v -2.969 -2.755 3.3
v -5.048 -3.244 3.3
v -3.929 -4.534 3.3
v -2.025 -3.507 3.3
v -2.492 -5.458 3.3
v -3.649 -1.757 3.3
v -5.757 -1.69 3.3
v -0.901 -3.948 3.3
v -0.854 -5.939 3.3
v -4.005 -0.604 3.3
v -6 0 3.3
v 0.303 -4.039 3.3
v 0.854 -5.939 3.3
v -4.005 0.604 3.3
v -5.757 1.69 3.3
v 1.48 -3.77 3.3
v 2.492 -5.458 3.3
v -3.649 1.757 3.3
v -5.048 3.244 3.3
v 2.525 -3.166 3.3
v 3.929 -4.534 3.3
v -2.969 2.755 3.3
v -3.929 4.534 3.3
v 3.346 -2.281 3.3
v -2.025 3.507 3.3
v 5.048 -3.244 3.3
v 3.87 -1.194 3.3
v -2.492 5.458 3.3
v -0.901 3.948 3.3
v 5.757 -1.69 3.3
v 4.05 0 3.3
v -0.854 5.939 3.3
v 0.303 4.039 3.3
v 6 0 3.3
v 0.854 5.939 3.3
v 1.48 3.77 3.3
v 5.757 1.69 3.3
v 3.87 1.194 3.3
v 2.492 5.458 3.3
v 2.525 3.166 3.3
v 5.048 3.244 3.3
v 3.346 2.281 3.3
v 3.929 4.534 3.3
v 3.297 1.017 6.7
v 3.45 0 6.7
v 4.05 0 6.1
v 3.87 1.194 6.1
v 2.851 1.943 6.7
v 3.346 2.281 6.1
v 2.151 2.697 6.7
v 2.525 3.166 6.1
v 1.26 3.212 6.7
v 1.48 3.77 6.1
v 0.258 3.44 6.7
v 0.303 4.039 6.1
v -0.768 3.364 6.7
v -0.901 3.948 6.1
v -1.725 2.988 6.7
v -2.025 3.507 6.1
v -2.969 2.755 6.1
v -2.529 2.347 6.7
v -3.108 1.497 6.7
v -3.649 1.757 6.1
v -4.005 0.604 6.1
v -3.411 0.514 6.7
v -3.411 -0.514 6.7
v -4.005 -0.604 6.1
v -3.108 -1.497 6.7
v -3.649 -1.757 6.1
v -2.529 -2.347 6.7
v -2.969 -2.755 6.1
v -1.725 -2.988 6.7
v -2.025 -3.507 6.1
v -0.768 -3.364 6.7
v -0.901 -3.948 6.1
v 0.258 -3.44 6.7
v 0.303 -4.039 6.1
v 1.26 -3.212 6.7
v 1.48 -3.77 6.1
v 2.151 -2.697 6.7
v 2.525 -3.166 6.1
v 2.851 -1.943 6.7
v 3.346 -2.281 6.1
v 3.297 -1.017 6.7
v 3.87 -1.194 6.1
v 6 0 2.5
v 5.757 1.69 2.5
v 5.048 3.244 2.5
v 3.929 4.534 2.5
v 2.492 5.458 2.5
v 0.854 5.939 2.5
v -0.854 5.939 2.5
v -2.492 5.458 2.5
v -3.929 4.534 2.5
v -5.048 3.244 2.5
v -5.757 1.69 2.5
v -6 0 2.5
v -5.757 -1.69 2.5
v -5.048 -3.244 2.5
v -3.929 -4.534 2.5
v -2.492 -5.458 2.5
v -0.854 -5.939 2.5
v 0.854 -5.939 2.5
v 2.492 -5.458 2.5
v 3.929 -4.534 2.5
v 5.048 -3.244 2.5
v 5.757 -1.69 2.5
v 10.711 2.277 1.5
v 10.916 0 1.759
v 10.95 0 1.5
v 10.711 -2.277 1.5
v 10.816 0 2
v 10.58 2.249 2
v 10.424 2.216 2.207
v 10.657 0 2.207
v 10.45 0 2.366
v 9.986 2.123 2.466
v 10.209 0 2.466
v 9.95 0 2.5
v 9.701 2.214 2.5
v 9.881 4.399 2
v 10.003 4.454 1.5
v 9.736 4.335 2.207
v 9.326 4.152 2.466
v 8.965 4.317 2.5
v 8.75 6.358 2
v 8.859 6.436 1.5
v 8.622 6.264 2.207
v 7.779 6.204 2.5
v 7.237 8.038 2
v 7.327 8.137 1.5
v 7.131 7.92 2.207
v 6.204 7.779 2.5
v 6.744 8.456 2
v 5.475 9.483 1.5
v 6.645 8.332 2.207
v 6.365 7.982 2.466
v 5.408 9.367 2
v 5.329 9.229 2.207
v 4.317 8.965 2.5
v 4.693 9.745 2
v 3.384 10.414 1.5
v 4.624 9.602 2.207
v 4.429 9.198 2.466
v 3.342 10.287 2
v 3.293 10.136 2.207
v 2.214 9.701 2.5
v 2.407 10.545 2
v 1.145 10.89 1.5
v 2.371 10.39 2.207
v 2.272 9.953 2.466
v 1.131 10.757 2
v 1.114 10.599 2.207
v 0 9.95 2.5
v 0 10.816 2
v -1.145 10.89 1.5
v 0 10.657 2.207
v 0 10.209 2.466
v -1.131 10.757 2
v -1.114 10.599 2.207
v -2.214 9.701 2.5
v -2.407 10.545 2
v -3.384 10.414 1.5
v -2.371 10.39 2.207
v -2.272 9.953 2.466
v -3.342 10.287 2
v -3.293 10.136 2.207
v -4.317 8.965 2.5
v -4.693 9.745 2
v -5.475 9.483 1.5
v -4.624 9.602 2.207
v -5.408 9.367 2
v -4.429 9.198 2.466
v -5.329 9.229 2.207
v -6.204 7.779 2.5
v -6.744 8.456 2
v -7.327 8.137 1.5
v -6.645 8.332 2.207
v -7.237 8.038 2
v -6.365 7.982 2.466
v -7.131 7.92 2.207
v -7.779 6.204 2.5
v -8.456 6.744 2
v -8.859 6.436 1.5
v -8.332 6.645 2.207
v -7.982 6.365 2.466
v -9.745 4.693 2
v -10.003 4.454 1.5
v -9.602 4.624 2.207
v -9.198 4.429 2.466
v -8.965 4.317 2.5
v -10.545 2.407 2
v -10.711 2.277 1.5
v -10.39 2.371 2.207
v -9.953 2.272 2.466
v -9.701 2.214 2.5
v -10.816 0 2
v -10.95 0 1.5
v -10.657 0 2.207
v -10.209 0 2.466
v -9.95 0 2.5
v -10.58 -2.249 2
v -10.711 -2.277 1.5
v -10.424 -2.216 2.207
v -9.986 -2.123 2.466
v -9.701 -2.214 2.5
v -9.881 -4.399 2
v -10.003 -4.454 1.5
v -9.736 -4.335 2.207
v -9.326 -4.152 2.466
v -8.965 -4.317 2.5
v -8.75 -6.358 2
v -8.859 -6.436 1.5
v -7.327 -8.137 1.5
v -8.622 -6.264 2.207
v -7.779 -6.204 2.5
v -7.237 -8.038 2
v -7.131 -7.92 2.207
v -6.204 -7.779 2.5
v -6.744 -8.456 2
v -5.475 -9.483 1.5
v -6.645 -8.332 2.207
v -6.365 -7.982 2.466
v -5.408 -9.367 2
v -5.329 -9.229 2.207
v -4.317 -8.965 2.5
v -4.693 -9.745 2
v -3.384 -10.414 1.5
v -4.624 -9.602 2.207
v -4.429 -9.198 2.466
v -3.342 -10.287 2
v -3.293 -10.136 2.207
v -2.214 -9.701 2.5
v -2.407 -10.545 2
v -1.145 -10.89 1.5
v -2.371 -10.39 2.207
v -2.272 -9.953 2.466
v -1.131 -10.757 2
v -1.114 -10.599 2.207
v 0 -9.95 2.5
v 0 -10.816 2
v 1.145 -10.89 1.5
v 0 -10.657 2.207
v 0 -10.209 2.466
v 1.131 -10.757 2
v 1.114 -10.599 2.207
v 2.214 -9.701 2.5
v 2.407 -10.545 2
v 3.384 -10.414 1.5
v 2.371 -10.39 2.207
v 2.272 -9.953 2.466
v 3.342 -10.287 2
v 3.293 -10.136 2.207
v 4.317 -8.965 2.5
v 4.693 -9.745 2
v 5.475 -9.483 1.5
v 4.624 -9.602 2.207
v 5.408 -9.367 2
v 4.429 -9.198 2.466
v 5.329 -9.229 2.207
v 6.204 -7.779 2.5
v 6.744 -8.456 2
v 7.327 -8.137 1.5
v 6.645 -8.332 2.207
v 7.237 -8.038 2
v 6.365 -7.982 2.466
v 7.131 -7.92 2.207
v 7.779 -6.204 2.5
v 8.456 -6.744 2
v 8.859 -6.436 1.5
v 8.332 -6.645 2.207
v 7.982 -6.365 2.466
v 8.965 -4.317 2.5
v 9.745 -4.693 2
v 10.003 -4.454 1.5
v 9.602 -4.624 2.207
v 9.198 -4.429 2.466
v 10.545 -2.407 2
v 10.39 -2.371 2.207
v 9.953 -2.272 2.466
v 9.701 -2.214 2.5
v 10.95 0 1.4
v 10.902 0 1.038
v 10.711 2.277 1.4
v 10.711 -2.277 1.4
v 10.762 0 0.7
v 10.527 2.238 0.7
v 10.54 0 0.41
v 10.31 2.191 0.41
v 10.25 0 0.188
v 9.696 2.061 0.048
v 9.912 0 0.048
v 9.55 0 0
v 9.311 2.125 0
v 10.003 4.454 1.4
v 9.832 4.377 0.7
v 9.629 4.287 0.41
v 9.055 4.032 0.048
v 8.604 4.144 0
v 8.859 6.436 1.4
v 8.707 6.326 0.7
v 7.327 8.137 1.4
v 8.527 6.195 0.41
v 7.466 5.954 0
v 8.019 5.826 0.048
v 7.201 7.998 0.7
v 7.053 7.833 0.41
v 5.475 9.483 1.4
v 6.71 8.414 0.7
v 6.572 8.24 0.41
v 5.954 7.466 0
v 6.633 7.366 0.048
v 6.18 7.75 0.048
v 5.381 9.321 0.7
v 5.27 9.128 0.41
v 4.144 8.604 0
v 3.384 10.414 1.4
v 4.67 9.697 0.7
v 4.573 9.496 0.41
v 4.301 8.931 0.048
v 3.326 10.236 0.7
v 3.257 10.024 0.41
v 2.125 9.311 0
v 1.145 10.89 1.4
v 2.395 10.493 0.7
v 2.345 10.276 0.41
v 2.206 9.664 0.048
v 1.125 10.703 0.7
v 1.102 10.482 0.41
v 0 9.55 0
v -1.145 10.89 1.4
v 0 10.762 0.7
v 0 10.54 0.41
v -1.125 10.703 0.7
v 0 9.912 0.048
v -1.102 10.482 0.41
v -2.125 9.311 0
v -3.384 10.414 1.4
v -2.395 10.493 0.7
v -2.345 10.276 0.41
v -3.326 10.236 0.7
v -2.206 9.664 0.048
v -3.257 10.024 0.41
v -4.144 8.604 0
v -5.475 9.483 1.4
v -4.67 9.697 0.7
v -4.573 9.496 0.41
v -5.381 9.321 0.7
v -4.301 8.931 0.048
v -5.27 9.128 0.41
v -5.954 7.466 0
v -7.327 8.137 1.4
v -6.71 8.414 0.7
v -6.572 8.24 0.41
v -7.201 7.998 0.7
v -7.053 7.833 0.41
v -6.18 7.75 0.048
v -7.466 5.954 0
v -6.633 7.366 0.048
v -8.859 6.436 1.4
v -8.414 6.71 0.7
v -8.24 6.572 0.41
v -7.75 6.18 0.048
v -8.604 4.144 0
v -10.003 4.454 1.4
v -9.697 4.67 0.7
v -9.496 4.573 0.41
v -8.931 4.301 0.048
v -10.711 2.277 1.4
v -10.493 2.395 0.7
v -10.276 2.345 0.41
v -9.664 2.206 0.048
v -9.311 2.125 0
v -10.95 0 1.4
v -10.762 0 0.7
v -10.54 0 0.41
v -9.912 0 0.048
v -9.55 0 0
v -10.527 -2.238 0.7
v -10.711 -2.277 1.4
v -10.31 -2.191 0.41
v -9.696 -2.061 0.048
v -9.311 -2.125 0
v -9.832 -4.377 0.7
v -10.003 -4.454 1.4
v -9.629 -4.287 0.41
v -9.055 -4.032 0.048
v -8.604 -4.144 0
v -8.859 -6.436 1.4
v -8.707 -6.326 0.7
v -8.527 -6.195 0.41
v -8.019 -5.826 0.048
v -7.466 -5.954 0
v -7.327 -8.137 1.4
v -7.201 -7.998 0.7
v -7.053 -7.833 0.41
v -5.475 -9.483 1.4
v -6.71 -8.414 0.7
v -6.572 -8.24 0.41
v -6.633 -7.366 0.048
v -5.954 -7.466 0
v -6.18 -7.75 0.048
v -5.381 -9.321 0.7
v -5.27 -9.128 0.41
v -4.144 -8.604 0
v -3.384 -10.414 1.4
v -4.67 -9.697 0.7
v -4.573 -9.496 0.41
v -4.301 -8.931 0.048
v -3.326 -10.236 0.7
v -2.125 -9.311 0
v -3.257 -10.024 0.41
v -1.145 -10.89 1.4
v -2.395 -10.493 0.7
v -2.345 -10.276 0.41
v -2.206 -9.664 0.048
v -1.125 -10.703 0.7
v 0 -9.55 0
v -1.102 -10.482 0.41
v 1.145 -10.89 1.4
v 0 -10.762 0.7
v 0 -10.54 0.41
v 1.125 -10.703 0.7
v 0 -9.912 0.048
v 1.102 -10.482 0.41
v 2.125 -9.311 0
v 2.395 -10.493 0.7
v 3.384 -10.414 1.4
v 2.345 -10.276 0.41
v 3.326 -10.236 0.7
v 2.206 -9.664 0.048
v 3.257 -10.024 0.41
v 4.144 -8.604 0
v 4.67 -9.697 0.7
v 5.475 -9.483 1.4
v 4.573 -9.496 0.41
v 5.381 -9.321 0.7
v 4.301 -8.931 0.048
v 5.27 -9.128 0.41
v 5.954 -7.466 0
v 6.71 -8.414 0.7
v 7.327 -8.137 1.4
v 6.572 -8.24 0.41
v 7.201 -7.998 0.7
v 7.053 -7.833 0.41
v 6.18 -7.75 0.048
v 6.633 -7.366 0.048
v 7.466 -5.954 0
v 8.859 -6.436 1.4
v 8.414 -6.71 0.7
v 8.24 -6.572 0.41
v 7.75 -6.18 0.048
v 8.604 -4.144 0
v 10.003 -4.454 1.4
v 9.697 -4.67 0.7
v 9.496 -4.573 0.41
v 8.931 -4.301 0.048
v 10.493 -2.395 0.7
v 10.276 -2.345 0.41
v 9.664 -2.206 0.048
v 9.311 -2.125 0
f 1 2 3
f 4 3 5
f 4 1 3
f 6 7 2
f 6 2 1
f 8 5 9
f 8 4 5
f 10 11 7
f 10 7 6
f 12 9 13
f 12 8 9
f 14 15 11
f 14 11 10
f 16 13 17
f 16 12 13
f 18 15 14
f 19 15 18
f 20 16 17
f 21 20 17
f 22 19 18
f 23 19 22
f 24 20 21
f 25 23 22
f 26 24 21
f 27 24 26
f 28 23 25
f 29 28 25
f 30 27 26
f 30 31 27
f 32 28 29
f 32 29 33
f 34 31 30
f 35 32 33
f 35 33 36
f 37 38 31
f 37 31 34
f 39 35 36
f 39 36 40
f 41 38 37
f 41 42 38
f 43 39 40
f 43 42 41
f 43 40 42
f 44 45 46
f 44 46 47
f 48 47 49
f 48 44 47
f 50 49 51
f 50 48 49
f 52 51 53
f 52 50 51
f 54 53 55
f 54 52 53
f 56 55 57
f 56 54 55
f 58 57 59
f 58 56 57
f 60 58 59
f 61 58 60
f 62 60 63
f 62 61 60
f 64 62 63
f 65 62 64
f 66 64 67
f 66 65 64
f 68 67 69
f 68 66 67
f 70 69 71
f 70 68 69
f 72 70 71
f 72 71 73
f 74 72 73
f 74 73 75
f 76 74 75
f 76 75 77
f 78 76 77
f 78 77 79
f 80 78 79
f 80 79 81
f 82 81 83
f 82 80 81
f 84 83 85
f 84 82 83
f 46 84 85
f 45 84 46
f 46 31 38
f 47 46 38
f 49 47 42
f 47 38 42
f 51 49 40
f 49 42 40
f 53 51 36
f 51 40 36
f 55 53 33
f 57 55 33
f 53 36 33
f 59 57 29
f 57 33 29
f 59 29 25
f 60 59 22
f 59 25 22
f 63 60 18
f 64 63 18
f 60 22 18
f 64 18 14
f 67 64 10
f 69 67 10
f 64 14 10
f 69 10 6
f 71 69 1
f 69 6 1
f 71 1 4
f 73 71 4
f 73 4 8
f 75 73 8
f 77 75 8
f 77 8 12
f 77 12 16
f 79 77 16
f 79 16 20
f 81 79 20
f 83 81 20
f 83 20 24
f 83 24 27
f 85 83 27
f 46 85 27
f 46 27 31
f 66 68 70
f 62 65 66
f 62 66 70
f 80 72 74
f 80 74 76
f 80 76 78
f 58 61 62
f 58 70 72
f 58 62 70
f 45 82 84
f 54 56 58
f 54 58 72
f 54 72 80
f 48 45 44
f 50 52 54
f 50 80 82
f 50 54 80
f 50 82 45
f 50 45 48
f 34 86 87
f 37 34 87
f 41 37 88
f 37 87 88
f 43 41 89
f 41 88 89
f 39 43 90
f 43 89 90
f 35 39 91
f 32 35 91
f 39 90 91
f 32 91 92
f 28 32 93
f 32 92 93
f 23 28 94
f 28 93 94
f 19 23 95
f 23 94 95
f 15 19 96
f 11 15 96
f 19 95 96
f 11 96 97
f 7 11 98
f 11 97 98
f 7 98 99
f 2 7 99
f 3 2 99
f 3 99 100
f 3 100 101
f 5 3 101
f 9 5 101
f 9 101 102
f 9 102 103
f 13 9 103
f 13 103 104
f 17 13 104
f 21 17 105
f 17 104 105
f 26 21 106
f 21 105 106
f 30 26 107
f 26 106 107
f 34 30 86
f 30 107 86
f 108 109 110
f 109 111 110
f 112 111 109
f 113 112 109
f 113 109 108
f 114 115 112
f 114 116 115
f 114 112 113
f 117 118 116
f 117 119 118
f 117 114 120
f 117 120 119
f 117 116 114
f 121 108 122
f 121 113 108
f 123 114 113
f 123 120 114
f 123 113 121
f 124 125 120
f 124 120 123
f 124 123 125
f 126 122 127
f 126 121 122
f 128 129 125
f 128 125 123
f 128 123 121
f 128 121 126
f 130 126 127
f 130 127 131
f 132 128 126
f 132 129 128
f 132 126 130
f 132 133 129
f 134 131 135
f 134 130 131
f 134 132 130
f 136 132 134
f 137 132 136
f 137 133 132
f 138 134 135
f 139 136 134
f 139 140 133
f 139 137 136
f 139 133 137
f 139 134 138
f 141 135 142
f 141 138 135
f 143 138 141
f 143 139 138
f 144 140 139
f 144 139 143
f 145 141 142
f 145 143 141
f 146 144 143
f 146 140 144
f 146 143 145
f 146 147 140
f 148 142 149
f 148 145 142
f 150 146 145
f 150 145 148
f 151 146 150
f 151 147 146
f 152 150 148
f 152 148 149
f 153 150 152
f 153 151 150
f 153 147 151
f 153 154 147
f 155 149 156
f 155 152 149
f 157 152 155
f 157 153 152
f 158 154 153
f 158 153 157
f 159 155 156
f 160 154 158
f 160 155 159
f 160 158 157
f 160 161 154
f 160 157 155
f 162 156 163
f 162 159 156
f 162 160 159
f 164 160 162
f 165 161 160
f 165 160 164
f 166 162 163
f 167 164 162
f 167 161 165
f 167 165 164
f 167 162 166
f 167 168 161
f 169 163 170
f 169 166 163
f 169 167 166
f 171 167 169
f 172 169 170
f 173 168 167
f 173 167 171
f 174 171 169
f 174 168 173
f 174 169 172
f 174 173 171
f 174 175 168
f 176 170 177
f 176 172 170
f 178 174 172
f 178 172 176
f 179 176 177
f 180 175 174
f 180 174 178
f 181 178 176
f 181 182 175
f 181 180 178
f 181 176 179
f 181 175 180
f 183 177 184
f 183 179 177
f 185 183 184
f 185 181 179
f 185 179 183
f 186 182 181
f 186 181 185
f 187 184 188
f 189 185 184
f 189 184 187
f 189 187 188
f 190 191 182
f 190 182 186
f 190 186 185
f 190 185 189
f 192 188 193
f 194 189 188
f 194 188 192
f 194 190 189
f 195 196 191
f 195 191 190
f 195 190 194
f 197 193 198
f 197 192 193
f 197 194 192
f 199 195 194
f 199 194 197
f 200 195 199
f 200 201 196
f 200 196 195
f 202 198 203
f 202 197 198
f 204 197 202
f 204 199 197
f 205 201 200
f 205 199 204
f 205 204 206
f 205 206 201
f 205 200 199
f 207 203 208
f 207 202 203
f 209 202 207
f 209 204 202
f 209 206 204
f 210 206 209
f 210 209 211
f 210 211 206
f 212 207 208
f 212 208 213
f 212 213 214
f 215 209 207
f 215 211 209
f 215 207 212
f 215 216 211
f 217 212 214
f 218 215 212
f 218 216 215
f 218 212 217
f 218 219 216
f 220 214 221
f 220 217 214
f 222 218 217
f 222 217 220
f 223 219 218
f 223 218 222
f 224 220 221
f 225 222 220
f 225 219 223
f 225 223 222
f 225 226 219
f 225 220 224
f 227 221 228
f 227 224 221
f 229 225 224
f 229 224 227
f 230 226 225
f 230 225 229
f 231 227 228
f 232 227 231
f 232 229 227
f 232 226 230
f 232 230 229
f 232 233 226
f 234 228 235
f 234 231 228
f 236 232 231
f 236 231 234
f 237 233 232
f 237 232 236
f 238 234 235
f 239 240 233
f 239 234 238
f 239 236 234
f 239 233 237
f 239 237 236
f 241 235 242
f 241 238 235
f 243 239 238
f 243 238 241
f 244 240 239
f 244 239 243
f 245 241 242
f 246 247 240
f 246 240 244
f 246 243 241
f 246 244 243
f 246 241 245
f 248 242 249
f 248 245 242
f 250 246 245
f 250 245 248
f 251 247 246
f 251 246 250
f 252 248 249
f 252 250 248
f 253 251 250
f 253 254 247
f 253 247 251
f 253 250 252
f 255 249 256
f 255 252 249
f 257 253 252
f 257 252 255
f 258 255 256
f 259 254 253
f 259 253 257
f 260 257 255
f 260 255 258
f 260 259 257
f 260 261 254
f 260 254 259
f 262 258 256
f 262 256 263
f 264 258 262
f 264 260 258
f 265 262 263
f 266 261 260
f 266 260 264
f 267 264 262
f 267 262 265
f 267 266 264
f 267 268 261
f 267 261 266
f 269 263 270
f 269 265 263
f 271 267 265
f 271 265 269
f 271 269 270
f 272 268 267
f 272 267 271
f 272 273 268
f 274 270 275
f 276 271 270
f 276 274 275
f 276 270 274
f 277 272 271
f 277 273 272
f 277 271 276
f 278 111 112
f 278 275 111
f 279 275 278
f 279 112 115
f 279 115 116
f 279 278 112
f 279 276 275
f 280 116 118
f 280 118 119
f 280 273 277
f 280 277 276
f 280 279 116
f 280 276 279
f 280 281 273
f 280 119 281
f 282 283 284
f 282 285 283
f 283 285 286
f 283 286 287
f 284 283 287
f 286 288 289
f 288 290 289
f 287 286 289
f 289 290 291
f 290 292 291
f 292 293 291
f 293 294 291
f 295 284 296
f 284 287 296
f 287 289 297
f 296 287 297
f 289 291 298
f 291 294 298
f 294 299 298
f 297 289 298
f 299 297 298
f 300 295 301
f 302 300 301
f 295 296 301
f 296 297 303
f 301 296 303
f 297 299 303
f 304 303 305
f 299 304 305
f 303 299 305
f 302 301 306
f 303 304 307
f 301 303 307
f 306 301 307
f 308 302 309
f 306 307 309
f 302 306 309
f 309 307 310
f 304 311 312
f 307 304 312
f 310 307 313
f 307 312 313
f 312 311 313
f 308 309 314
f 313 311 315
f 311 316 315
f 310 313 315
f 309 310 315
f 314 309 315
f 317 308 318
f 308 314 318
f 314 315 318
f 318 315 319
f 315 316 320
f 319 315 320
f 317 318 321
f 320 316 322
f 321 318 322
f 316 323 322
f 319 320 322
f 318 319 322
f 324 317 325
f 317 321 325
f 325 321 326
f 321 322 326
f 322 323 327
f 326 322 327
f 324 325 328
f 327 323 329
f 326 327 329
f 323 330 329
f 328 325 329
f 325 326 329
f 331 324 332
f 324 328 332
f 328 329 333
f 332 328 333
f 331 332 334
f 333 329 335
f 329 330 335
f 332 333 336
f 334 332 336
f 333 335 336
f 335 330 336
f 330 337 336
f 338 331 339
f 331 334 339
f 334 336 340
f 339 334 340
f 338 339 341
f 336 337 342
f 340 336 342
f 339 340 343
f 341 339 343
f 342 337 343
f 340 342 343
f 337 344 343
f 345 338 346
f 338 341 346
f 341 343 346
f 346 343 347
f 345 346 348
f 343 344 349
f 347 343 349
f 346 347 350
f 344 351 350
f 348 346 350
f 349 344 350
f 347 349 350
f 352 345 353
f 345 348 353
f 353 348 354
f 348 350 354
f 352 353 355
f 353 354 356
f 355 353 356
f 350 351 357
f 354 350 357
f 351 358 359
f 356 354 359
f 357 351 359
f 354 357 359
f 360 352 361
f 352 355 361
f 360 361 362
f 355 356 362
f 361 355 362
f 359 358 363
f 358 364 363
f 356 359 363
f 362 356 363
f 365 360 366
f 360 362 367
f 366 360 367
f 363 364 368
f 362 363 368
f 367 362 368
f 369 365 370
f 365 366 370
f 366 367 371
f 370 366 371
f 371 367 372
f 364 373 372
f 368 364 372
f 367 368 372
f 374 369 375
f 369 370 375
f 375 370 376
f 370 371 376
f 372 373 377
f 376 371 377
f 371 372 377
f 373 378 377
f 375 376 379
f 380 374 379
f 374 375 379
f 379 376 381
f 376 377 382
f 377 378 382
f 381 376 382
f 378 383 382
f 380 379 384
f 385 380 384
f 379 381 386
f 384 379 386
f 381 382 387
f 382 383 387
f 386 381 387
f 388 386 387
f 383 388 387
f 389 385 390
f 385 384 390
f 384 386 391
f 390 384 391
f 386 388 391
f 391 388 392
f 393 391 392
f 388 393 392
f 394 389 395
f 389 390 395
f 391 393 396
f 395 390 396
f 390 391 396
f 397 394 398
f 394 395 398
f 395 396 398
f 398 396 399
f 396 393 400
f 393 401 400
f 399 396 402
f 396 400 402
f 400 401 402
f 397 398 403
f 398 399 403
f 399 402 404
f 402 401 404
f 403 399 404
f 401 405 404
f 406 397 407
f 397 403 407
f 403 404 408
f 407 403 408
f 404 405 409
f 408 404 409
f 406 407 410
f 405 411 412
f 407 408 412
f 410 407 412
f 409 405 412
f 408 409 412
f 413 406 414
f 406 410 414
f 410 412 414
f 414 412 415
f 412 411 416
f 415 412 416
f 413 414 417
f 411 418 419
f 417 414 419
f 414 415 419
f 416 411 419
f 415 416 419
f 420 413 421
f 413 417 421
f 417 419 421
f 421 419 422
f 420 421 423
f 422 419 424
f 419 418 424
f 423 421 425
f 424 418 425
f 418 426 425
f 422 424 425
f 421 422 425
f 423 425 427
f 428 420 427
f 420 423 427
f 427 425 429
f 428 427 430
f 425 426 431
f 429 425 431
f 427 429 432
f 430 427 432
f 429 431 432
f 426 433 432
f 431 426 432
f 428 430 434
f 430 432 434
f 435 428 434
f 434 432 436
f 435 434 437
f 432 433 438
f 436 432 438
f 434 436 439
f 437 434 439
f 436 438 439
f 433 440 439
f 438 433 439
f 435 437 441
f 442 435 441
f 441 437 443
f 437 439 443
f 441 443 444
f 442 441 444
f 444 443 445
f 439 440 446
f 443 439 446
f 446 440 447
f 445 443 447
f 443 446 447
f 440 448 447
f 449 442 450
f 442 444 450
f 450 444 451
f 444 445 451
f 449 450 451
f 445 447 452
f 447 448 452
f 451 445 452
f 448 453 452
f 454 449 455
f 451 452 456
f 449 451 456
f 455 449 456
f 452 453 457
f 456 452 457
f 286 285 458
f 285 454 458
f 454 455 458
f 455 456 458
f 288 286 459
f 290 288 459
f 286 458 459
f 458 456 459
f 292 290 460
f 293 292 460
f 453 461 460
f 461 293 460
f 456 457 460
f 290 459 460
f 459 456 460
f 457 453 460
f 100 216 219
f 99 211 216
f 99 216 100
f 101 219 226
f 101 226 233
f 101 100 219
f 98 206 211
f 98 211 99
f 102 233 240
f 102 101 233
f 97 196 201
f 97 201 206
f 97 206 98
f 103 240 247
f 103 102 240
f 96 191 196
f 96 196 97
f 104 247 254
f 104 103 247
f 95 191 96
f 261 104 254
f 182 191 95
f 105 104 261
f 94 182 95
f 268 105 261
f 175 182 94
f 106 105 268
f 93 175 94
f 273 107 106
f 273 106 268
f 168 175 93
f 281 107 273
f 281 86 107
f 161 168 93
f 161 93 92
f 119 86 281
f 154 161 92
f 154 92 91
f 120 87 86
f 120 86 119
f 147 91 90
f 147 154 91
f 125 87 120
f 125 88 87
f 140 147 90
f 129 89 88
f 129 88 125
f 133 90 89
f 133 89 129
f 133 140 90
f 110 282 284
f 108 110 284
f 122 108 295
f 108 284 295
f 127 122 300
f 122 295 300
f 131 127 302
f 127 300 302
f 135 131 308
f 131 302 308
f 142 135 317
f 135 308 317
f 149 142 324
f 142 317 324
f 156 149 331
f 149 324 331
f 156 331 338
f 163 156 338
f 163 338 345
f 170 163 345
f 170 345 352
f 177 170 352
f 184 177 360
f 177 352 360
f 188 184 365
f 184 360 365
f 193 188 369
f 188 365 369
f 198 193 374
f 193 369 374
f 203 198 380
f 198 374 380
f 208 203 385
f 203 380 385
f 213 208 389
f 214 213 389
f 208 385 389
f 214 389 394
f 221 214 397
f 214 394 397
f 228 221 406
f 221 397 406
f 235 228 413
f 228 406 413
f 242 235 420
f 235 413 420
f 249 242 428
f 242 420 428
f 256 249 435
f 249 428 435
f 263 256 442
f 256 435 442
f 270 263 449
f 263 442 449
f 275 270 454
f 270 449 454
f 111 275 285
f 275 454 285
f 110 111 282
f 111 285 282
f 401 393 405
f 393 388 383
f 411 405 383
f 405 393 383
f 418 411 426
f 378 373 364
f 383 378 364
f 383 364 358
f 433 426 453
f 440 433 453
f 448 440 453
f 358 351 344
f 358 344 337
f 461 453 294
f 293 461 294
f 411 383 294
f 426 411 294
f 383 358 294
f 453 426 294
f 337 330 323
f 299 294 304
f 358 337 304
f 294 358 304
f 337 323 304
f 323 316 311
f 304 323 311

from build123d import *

# Parameters (mm, degrees)
F0_R     = 10.95
F1_DEPTH = 2.5
F2_R     = 4.05
F3_DEPTH = 4.2
F4_R     = 1
F5_R     = 6
F6_DEPTH = 0.8
F7_R     = 1.4
F8_SIZE  = 0.6


with BuildPart() as f1:
    # F0 (on Top) → F1 (new body)
    with BuildSketch(Plane.XY):
        Circle(F0_R)
    extrude(amount=F1_DEPTH)

    # F2 (on face) → F3 (join)
    with BuildSketch(Plane.XY.offset(2.5)):
        Circle(F2_R)
    extrude(amount=F3_DEPTH)

    # F4
    f4_edges = [f1.edges().sort_by_distance(p)[0] for p in [
        (-10.95, 0, 2.5),
    ]]
    fillet(f4_edges, radius=F4_R)

    # F5 (on face) → F6 (join)
    with BuildSketch(Plane.XY.offset(2.5)):
        Circle(F5_R)
    extrude(amount=F6_DEPTH)

    # F7
    f7_edges = [f1.edges().sort_by_distance(p)[0] for p in [
        (-10.95, 0, 0),
    ]]
    fillet(f7_edges, radius=F7_R)

    # F8
    f8_edges = [f1.edges().sort_by_distance(p)[0] for p in [
        (-4.05, 0, 6.7),
    ]]
    chamfer(f8_edges, length=F8_SIZE)


solid = f1.part
